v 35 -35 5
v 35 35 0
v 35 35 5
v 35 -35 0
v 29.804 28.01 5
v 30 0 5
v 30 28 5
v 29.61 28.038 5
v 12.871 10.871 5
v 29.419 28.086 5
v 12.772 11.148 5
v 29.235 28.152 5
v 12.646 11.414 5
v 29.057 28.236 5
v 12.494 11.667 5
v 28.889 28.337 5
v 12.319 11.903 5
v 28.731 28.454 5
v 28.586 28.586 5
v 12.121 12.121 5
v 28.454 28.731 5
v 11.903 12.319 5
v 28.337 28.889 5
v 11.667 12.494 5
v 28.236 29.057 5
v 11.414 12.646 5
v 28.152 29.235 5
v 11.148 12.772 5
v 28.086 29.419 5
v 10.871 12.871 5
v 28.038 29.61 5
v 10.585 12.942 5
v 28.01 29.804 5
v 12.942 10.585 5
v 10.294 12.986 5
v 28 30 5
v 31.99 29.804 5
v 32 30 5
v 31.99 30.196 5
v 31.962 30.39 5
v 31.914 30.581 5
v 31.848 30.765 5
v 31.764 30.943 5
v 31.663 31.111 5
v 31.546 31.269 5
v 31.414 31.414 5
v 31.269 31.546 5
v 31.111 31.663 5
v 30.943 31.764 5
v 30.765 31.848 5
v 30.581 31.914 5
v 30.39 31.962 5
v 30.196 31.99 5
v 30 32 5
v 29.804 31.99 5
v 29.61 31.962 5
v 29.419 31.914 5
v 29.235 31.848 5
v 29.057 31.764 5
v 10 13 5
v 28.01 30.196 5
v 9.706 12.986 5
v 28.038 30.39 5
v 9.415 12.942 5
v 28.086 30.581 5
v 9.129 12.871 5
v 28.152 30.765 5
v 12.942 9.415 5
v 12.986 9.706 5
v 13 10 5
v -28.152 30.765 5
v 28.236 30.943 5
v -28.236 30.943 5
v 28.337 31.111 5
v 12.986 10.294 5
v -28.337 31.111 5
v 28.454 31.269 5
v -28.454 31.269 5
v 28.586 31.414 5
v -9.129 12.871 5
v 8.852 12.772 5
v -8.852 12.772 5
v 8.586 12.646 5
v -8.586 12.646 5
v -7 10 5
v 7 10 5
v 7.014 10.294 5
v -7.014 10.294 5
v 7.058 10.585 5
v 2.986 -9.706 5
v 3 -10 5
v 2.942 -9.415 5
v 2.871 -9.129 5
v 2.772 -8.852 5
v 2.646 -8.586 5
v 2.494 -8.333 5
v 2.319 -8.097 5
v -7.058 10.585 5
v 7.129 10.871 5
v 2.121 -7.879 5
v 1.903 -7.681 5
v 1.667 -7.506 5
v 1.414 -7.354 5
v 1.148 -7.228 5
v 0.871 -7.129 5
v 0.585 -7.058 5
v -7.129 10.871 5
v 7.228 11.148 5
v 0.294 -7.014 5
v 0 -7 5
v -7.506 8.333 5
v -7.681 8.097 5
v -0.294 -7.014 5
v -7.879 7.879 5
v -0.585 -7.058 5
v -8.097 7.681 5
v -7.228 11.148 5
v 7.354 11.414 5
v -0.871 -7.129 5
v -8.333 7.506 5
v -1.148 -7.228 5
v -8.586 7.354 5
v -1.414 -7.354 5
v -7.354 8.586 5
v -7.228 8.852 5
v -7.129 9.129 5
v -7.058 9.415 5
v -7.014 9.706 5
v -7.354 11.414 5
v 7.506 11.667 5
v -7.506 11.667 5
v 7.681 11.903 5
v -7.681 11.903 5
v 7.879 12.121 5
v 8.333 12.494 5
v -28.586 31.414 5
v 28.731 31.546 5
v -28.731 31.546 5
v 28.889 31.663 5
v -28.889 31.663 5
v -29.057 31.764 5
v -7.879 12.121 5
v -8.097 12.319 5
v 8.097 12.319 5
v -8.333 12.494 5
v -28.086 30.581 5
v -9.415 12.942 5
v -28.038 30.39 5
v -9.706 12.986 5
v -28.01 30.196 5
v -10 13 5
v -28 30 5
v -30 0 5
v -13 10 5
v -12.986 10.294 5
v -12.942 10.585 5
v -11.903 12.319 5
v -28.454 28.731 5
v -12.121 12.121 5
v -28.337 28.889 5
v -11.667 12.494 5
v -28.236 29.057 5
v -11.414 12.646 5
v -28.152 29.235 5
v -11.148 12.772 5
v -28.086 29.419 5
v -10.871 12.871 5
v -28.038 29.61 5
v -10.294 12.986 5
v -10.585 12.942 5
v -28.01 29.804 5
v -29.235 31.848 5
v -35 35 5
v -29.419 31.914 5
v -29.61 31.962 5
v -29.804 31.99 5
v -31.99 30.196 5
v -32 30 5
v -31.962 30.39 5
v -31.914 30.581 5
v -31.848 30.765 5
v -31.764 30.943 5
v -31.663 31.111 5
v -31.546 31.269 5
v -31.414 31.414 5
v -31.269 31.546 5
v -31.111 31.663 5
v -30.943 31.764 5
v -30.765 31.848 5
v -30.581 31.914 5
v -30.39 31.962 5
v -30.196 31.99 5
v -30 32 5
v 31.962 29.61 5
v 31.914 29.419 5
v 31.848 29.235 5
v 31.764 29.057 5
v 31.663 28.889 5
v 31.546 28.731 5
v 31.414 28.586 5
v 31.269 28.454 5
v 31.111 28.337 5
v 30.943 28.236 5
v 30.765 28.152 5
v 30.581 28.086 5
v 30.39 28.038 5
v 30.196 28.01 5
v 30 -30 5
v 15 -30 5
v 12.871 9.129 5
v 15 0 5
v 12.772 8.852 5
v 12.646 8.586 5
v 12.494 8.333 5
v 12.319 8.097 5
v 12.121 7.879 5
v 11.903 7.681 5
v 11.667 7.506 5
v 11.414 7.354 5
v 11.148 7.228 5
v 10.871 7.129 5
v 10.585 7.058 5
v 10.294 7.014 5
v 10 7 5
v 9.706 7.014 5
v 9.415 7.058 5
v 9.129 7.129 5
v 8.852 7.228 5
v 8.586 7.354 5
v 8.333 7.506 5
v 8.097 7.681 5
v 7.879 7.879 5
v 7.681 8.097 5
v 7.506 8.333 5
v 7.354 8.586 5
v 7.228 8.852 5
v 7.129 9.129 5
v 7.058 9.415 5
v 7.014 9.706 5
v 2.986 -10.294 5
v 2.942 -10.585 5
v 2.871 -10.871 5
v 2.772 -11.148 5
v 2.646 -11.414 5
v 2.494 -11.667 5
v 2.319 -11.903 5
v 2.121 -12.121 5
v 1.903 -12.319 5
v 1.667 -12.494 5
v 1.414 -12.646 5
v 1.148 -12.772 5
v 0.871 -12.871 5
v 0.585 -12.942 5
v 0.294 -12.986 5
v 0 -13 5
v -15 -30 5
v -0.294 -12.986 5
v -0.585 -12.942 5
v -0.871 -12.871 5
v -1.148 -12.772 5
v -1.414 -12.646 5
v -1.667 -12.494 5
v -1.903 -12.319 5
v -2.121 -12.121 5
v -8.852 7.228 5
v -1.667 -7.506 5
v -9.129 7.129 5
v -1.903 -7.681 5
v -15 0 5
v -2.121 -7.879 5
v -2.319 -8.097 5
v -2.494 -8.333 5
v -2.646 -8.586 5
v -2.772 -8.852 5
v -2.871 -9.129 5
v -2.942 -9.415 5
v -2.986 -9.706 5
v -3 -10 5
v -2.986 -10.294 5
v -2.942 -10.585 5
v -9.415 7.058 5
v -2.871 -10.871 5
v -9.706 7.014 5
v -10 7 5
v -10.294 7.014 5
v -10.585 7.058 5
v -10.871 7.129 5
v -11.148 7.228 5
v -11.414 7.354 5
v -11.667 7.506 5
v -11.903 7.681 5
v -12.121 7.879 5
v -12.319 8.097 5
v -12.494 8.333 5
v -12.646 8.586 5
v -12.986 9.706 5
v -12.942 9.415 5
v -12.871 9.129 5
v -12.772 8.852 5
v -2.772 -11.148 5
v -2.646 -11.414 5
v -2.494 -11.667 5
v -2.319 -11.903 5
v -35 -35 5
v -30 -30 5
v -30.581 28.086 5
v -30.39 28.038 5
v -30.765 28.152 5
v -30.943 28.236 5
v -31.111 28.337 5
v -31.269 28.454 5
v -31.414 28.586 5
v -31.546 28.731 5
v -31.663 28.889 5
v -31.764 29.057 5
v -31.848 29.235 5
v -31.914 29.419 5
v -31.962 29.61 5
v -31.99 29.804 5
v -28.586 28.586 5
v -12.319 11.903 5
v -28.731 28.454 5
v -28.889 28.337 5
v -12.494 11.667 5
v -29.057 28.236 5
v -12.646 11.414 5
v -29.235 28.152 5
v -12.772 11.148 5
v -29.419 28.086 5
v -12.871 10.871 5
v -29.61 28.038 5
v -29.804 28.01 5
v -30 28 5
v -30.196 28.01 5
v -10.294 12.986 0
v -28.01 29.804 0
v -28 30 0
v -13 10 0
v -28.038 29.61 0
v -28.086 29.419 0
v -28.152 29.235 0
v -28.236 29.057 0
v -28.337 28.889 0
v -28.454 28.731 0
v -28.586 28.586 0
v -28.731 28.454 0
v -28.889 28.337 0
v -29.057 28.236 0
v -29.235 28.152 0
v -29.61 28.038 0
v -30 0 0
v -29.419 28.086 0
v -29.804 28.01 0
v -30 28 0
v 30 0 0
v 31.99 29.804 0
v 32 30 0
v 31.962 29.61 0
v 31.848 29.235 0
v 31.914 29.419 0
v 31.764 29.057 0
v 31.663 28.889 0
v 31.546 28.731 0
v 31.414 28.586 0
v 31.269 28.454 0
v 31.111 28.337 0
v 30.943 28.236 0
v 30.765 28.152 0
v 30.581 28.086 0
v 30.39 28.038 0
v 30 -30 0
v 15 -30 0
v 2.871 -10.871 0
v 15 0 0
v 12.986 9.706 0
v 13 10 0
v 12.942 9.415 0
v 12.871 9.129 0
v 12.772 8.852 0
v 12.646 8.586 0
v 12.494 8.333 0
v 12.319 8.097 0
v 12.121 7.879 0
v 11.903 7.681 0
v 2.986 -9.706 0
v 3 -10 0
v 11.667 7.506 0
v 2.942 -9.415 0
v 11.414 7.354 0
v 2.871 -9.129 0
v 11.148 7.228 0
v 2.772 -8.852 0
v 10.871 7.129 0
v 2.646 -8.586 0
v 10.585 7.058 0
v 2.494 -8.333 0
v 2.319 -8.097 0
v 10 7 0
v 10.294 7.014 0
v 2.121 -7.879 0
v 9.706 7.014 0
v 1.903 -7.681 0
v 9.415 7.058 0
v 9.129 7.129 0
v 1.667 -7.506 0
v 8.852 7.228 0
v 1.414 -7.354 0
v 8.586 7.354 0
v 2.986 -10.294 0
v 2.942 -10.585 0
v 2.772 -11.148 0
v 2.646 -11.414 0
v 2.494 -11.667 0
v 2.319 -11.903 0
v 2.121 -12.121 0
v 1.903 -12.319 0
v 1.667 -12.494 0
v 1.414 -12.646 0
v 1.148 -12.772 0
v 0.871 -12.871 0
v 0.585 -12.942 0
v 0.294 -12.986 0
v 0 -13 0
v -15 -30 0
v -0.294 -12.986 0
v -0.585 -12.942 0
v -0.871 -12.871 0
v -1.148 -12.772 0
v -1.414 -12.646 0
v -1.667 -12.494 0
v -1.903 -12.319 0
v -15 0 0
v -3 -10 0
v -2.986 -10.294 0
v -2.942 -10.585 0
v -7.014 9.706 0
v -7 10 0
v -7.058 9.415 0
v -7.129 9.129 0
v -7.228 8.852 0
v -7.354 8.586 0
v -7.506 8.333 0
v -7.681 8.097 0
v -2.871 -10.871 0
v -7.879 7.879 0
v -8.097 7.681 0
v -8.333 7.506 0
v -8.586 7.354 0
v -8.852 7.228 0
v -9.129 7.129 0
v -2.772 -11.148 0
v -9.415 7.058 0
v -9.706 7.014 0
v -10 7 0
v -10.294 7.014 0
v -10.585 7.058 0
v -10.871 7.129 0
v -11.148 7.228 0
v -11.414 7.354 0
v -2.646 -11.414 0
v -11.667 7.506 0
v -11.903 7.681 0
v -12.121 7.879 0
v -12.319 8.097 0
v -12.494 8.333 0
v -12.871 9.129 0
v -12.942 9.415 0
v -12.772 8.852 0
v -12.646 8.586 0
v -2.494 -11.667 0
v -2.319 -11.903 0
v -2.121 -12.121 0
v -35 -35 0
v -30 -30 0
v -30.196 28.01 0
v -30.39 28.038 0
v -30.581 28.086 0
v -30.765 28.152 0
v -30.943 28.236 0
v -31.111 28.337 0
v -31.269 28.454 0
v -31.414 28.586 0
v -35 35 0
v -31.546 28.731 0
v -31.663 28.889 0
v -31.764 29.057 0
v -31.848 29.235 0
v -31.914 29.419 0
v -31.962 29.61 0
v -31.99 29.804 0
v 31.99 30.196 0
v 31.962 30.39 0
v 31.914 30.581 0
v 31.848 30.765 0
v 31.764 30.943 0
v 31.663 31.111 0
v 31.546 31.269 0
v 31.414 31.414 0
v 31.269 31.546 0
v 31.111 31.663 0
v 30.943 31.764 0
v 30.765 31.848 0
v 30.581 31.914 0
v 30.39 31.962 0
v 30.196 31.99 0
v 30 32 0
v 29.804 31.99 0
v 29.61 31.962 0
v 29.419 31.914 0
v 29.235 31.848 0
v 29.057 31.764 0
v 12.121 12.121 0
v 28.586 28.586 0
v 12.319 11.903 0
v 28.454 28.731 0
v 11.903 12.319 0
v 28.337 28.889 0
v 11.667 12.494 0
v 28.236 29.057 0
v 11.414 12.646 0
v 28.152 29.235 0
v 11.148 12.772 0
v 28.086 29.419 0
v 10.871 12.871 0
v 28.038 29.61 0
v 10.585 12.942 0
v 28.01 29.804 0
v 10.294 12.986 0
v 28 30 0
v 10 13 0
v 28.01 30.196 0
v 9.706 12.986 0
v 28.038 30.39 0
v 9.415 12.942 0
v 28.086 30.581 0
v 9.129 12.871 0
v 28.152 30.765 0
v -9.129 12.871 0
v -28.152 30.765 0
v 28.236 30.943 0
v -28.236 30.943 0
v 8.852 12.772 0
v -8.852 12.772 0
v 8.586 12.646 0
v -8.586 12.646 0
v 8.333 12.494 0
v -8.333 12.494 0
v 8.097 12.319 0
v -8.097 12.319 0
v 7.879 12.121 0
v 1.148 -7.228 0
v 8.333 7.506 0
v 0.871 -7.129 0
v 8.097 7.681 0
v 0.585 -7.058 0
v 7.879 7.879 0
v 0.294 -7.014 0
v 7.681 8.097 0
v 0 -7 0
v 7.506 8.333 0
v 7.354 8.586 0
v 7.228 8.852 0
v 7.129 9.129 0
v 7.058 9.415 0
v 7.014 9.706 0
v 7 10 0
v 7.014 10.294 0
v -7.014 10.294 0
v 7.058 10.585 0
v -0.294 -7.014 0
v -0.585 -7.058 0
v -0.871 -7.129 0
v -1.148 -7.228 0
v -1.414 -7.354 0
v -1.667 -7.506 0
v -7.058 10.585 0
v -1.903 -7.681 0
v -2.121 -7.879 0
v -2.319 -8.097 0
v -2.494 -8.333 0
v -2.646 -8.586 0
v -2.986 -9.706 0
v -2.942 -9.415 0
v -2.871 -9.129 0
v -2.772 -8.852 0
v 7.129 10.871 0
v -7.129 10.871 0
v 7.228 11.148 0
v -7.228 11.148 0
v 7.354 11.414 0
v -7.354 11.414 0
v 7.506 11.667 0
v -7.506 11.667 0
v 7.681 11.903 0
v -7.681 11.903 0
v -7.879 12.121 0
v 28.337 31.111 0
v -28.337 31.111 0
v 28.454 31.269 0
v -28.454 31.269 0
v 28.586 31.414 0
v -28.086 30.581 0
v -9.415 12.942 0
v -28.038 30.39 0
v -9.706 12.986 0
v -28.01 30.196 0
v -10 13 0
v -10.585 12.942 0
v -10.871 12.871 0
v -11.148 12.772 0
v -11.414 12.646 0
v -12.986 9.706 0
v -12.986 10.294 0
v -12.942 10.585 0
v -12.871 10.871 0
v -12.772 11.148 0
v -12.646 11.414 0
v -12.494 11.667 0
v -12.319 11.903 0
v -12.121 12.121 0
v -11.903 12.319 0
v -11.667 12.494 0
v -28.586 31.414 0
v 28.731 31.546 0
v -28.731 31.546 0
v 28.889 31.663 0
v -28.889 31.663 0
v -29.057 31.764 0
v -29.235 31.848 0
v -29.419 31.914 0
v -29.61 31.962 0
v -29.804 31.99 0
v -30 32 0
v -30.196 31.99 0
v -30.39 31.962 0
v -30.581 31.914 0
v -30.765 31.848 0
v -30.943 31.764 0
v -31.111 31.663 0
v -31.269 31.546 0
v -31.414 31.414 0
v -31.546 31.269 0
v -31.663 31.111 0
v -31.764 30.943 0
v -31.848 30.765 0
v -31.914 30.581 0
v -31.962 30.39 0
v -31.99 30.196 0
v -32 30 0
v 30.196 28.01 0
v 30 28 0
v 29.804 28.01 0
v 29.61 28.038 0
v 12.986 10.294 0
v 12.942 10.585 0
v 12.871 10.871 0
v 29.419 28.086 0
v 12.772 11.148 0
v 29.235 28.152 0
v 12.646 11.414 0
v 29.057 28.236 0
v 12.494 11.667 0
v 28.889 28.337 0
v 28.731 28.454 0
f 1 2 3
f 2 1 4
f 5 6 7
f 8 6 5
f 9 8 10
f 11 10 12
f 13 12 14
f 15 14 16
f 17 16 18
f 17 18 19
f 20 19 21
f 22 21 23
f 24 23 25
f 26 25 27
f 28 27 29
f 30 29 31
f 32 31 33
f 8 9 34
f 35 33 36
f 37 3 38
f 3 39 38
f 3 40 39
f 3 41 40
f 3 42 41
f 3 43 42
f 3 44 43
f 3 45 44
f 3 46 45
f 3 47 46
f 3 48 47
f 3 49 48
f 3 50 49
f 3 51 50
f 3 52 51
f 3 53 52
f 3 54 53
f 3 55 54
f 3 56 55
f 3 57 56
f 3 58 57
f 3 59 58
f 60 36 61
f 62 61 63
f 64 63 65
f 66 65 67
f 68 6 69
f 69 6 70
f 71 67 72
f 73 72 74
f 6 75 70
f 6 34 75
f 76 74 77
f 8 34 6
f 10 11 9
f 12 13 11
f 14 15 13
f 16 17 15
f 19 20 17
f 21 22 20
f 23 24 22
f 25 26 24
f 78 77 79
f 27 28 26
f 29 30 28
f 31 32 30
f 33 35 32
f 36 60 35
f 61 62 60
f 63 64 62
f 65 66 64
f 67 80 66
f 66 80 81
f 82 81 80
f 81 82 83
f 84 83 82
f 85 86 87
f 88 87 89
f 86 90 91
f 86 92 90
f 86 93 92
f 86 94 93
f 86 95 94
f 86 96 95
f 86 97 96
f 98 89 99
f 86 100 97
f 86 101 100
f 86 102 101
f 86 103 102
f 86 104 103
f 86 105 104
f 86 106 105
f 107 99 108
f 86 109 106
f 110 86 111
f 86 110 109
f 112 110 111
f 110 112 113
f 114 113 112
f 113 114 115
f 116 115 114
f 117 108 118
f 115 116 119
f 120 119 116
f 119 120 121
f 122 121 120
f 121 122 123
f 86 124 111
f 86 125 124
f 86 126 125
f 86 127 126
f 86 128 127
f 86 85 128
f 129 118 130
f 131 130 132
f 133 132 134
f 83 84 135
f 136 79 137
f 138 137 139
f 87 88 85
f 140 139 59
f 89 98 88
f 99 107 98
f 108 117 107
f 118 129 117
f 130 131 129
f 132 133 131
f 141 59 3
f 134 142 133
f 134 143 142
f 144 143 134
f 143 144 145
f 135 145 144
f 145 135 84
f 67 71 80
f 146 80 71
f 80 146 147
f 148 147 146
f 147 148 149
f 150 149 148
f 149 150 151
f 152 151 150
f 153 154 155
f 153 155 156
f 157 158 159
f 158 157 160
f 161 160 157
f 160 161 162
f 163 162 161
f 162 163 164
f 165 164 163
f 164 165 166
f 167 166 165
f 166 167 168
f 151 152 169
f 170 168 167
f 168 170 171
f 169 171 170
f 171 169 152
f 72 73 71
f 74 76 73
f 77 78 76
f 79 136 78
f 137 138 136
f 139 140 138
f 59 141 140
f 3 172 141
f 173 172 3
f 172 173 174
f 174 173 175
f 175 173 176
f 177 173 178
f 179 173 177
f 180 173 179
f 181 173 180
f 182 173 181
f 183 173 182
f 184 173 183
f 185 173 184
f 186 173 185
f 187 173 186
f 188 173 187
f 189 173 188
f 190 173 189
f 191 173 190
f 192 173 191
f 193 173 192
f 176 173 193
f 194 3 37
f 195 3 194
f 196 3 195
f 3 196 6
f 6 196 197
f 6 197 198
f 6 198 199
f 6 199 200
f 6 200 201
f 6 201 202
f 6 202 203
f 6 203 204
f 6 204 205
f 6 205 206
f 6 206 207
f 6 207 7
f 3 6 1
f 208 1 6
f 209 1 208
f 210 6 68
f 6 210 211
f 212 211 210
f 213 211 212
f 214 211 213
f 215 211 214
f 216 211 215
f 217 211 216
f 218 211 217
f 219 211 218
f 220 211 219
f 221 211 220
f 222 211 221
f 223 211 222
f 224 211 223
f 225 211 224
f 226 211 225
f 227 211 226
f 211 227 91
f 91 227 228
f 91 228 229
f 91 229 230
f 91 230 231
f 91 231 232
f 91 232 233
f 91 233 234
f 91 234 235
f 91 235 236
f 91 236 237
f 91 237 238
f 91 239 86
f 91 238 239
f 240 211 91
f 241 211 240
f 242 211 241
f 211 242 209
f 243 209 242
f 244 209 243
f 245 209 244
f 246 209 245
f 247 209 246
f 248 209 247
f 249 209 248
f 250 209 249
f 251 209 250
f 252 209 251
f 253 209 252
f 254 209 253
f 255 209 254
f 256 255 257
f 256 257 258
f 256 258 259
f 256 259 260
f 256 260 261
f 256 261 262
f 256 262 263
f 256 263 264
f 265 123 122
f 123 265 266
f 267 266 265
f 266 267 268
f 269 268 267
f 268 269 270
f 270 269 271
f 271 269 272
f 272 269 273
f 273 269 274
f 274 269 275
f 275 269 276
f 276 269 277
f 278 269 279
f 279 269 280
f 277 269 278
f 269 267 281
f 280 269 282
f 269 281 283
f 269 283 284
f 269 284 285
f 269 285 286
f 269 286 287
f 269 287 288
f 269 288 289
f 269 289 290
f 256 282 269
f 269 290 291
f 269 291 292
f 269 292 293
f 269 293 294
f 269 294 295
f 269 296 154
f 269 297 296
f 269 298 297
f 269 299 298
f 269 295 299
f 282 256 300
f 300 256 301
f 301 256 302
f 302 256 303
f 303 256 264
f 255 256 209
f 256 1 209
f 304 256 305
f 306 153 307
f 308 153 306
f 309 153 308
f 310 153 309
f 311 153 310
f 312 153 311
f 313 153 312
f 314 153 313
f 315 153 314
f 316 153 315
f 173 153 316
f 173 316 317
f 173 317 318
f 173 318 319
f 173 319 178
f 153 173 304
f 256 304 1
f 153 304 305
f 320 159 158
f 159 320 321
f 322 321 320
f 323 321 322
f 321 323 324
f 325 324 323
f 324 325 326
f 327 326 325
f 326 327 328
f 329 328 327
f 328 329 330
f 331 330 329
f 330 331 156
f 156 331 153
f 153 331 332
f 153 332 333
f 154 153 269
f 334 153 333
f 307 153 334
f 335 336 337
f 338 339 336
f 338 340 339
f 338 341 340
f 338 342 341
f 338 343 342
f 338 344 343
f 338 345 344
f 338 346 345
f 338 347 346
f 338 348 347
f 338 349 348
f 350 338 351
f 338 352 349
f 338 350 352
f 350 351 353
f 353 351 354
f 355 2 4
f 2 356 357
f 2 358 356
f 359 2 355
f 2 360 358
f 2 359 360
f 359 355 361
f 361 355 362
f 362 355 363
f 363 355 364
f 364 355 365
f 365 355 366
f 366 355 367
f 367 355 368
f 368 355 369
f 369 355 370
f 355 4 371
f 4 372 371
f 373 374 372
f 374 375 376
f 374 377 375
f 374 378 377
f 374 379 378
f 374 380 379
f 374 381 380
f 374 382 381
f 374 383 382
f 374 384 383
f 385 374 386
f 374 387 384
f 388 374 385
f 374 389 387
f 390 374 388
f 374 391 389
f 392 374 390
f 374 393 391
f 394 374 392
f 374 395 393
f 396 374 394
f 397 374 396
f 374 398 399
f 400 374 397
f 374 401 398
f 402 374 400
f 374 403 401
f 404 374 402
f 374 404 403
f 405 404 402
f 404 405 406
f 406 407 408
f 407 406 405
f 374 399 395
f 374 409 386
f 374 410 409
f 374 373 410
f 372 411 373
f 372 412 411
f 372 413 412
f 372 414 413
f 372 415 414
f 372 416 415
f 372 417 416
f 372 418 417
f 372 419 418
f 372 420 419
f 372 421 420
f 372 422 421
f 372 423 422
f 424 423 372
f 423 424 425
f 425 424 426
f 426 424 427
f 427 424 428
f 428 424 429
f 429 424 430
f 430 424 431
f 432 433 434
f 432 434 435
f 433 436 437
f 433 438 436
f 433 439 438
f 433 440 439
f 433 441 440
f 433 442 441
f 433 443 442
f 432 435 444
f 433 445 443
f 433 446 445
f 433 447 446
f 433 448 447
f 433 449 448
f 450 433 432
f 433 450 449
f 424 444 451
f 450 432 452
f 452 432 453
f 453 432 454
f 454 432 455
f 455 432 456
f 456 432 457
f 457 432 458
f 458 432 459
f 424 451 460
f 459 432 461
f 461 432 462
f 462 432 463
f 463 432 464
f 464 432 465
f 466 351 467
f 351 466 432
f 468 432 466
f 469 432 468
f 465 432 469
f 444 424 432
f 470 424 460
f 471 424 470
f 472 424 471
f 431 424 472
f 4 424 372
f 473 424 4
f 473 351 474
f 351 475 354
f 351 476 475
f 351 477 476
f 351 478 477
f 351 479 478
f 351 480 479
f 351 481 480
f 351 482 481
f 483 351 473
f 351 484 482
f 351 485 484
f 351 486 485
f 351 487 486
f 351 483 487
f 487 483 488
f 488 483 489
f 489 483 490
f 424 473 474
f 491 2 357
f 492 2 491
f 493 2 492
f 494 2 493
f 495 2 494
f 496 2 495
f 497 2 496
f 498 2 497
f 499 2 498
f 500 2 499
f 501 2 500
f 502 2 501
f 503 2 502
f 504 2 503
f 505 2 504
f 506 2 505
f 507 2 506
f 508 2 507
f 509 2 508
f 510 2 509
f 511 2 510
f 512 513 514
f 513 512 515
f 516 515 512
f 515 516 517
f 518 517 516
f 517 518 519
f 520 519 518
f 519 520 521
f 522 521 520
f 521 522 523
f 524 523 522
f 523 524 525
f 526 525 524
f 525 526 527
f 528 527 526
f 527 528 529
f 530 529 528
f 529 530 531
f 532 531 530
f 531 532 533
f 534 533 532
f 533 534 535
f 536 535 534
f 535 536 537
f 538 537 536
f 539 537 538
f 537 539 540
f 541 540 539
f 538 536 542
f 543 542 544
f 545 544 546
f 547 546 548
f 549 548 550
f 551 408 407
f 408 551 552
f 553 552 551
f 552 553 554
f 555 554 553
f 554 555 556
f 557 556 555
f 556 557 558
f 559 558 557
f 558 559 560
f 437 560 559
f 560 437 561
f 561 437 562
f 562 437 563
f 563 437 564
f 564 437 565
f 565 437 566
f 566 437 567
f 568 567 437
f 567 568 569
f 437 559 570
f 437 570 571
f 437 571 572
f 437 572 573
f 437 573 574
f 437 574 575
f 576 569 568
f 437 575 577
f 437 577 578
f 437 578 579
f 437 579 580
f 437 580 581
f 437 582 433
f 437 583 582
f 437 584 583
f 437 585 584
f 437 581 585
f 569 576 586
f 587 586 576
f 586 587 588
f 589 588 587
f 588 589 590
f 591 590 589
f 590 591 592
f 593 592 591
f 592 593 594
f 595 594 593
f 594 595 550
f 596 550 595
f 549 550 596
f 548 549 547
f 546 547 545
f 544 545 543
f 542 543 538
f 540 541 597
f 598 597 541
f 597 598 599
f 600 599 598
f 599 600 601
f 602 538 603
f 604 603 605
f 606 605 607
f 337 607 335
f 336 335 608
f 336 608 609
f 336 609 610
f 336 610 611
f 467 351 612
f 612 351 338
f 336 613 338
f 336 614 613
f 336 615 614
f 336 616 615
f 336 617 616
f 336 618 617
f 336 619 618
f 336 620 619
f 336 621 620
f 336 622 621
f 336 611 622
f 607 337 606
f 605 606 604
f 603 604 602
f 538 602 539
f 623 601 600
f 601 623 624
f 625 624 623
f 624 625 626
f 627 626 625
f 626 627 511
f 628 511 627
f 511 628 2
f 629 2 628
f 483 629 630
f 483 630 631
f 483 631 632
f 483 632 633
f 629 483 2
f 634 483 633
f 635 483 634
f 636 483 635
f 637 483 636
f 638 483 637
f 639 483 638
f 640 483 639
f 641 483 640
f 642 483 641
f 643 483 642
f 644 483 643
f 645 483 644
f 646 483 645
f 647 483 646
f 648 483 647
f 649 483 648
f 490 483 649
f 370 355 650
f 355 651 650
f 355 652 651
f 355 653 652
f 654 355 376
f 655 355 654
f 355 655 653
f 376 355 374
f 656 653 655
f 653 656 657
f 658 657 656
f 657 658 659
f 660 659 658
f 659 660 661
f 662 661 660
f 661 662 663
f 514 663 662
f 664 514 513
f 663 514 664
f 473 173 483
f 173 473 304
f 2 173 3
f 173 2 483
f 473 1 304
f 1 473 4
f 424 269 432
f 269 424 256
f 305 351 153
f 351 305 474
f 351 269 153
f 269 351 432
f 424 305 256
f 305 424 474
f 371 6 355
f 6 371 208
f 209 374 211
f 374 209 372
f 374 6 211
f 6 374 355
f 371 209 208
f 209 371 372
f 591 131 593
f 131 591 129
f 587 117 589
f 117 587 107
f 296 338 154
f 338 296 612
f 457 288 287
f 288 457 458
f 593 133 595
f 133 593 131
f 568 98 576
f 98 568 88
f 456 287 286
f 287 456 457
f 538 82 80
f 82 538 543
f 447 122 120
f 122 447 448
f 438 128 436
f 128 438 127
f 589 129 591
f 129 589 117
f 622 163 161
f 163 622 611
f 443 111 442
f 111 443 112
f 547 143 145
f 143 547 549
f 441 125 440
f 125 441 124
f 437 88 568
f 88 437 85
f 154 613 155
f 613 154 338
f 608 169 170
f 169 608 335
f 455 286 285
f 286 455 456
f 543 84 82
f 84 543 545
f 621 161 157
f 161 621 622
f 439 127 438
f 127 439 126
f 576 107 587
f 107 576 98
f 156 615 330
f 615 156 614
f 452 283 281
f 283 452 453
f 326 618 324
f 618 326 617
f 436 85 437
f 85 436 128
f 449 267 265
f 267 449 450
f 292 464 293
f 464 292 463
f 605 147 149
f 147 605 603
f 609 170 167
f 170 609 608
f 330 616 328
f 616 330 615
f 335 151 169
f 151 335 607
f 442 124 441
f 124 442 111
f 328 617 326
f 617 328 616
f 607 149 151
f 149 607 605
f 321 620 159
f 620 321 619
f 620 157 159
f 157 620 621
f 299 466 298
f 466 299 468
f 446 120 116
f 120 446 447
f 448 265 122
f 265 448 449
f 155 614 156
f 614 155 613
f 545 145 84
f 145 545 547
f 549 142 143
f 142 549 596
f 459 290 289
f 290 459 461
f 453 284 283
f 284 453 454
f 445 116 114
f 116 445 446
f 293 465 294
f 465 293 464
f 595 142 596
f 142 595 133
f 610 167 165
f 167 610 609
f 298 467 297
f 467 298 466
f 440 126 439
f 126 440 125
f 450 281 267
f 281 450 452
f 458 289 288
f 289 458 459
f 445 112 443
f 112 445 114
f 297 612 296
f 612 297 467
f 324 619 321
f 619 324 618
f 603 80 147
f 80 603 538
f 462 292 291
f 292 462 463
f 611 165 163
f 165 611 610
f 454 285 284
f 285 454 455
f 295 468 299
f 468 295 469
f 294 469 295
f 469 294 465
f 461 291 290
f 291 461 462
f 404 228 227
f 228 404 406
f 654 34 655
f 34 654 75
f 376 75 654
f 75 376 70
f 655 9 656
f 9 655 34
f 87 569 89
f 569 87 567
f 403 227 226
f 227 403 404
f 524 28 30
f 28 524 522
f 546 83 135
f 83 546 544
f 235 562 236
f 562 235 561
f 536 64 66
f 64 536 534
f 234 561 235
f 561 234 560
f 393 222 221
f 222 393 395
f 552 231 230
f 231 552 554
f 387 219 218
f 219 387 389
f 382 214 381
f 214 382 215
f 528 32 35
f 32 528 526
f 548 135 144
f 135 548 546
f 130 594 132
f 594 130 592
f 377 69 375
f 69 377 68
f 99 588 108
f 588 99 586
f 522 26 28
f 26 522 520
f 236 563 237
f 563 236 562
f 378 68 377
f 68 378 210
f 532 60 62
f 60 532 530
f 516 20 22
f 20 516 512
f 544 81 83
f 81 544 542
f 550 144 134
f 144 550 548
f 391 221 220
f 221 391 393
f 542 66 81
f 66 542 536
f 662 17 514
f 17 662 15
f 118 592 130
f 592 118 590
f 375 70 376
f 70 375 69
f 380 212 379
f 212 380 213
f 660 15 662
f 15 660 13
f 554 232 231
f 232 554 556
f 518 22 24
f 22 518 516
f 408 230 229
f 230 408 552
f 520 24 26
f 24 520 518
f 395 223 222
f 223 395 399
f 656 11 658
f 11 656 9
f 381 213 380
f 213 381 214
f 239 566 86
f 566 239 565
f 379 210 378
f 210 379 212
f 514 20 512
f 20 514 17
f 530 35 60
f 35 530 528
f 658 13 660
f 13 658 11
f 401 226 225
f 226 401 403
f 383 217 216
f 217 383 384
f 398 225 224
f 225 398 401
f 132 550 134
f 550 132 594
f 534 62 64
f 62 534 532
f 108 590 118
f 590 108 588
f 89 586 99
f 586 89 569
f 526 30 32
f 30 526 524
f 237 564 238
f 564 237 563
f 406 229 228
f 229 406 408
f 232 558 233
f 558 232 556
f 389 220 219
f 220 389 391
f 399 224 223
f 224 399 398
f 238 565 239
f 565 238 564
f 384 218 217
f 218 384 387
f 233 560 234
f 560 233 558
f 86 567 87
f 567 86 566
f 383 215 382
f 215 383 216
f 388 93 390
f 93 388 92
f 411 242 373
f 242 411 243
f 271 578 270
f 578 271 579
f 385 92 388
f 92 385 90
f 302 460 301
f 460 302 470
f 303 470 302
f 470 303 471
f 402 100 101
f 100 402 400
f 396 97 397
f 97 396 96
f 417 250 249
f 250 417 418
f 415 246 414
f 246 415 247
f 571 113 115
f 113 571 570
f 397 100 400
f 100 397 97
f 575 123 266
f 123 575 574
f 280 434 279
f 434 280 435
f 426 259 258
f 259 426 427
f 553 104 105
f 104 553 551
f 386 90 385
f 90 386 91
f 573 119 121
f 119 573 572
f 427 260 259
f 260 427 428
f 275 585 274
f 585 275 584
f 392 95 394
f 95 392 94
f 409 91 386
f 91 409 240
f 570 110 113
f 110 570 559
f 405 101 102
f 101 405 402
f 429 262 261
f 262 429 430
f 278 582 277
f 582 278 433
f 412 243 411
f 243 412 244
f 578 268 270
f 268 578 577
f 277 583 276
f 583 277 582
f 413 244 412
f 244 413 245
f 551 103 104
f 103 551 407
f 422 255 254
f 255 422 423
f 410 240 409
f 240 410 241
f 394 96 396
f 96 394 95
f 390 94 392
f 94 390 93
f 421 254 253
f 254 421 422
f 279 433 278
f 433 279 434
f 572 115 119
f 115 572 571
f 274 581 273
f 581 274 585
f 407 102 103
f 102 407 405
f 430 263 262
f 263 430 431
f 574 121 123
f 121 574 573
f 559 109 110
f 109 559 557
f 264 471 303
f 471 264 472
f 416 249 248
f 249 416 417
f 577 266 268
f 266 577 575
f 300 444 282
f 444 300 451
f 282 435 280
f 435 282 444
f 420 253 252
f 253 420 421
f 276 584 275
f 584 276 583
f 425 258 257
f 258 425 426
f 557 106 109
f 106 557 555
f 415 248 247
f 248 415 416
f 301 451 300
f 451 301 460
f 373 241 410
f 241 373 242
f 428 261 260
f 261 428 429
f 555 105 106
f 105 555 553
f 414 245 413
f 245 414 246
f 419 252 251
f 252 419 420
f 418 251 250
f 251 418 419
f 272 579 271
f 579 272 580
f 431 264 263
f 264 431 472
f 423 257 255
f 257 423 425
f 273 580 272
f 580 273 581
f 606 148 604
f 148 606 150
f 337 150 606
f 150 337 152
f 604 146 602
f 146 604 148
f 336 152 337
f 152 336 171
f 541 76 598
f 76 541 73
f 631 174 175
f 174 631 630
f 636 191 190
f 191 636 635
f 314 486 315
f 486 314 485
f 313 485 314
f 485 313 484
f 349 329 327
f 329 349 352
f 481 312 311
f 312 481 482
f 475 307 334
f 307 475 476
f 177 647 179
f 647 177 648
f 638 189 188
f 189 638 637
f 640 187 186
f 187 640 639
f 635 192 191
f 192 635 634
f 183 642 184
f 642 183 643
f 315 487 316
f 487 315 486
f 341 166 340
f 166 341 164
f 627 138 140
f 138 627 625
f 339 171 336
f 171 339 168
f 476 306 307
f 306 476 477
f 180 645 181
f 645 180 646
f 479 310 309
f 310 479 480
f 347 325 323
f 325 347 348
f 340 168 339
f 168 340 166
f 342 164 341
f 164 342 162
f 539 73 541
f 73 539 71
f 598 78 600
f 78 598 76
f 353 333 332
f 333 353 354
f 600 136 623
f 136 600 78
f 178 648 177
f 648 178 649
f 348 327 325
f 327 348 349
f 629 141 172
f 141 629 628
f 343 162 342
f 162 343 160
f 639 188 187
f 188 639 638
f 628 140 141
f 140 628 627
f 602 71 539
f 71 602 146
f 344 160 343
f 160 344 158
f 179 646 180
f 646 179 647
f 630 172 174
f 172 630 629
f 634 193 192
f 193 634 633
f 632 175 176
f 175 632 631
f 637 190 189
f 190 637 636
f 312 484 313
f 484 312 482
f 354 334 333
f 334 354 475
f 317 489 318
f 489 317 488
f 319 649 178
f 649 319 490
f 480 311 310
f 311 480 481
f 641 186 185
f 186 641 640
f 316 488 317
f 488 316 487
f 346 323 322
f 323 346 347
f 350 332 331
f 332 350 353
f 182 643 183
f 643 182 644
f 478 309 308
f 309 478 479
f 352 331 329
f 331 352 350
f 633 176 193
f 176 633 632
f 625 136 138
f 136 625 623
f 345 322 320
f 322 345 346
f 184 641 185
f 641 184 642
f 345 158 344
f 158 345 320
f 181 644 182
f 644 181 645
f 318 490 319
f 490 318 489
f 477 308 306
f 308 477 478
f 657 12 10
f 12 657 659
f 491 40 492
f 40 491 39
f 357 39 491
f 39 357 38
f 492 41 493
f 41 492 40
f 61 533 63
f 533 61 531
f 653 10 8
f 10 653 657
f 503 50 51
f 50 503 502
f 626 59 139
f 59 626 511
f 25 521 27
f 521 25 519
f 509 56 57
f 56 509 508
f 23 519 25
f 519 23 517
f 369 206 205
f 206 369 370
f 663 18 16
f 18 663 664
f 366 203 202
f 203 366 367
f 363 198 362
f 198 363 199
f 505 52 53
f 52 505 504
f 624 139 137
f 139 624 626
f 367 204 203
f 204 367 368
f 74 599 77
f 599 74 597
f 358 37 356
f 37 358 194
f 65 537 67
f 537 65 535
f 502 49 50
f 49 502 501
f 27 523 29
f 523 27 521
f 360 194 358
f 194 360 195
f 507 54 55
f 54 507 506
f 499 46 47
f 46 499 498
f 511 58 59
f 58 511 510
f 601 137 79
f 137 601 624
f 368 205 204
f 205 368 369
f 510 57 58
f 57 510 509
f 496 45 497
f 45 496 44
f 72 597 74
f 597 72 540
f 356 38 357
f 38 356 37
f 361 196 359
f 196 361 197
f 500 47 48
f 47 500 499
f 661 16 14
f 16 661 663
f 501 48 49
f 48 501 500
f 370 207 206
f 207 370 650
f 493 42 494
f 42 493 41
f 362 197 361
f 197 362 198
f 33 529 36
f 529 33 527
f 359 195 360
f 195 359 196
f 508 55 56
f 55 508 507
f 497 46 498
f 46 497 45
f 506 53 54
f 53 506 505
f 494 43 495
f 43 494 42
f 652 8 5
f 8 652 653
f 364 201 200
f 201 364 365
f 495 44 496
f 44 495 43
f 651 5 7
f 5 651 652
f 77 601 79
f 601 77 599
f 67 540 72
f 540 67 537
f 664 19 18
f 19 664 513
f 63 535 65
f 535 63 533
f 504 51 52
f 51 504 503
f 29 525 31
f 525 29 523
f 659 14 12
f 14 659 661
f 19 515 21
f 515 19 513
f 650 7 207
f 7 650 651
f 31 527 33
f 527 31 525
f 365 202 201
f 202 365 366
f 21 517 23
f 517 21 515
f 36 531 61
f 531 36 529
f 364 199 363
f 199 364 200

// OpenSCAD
module mains_socket() {
    difference() {
        // Main body of the socket
        translate([-35, -35, 0])
        cube([70, 70, 5]);

        // Cutouts for the switches
        translate([-30, -30, -1])
        cube([15, 30, 6]);
        translate([15, -30, -1])
        cube([15, 30, 6]);

        // Cutouts for the plug holes
        translate([-10, 10, -1])
        cylinder(h=6, r=3, $fn=64);
        translate([10, 10, -1])
        cylinder(h=6, r=3, $fn=64);
        translate([0, -10, -1])
        cylinder(h=6, r=3, $fn=64);

        // Cutouts for the screw holes
        translate([-30, 30, -1])
        cylinder(h=6, r=2, $fn=64);
        translate([30, 30, -1])
        cylinder(h=6, r=2, $fn=64);
    }
}

mains_socket();
